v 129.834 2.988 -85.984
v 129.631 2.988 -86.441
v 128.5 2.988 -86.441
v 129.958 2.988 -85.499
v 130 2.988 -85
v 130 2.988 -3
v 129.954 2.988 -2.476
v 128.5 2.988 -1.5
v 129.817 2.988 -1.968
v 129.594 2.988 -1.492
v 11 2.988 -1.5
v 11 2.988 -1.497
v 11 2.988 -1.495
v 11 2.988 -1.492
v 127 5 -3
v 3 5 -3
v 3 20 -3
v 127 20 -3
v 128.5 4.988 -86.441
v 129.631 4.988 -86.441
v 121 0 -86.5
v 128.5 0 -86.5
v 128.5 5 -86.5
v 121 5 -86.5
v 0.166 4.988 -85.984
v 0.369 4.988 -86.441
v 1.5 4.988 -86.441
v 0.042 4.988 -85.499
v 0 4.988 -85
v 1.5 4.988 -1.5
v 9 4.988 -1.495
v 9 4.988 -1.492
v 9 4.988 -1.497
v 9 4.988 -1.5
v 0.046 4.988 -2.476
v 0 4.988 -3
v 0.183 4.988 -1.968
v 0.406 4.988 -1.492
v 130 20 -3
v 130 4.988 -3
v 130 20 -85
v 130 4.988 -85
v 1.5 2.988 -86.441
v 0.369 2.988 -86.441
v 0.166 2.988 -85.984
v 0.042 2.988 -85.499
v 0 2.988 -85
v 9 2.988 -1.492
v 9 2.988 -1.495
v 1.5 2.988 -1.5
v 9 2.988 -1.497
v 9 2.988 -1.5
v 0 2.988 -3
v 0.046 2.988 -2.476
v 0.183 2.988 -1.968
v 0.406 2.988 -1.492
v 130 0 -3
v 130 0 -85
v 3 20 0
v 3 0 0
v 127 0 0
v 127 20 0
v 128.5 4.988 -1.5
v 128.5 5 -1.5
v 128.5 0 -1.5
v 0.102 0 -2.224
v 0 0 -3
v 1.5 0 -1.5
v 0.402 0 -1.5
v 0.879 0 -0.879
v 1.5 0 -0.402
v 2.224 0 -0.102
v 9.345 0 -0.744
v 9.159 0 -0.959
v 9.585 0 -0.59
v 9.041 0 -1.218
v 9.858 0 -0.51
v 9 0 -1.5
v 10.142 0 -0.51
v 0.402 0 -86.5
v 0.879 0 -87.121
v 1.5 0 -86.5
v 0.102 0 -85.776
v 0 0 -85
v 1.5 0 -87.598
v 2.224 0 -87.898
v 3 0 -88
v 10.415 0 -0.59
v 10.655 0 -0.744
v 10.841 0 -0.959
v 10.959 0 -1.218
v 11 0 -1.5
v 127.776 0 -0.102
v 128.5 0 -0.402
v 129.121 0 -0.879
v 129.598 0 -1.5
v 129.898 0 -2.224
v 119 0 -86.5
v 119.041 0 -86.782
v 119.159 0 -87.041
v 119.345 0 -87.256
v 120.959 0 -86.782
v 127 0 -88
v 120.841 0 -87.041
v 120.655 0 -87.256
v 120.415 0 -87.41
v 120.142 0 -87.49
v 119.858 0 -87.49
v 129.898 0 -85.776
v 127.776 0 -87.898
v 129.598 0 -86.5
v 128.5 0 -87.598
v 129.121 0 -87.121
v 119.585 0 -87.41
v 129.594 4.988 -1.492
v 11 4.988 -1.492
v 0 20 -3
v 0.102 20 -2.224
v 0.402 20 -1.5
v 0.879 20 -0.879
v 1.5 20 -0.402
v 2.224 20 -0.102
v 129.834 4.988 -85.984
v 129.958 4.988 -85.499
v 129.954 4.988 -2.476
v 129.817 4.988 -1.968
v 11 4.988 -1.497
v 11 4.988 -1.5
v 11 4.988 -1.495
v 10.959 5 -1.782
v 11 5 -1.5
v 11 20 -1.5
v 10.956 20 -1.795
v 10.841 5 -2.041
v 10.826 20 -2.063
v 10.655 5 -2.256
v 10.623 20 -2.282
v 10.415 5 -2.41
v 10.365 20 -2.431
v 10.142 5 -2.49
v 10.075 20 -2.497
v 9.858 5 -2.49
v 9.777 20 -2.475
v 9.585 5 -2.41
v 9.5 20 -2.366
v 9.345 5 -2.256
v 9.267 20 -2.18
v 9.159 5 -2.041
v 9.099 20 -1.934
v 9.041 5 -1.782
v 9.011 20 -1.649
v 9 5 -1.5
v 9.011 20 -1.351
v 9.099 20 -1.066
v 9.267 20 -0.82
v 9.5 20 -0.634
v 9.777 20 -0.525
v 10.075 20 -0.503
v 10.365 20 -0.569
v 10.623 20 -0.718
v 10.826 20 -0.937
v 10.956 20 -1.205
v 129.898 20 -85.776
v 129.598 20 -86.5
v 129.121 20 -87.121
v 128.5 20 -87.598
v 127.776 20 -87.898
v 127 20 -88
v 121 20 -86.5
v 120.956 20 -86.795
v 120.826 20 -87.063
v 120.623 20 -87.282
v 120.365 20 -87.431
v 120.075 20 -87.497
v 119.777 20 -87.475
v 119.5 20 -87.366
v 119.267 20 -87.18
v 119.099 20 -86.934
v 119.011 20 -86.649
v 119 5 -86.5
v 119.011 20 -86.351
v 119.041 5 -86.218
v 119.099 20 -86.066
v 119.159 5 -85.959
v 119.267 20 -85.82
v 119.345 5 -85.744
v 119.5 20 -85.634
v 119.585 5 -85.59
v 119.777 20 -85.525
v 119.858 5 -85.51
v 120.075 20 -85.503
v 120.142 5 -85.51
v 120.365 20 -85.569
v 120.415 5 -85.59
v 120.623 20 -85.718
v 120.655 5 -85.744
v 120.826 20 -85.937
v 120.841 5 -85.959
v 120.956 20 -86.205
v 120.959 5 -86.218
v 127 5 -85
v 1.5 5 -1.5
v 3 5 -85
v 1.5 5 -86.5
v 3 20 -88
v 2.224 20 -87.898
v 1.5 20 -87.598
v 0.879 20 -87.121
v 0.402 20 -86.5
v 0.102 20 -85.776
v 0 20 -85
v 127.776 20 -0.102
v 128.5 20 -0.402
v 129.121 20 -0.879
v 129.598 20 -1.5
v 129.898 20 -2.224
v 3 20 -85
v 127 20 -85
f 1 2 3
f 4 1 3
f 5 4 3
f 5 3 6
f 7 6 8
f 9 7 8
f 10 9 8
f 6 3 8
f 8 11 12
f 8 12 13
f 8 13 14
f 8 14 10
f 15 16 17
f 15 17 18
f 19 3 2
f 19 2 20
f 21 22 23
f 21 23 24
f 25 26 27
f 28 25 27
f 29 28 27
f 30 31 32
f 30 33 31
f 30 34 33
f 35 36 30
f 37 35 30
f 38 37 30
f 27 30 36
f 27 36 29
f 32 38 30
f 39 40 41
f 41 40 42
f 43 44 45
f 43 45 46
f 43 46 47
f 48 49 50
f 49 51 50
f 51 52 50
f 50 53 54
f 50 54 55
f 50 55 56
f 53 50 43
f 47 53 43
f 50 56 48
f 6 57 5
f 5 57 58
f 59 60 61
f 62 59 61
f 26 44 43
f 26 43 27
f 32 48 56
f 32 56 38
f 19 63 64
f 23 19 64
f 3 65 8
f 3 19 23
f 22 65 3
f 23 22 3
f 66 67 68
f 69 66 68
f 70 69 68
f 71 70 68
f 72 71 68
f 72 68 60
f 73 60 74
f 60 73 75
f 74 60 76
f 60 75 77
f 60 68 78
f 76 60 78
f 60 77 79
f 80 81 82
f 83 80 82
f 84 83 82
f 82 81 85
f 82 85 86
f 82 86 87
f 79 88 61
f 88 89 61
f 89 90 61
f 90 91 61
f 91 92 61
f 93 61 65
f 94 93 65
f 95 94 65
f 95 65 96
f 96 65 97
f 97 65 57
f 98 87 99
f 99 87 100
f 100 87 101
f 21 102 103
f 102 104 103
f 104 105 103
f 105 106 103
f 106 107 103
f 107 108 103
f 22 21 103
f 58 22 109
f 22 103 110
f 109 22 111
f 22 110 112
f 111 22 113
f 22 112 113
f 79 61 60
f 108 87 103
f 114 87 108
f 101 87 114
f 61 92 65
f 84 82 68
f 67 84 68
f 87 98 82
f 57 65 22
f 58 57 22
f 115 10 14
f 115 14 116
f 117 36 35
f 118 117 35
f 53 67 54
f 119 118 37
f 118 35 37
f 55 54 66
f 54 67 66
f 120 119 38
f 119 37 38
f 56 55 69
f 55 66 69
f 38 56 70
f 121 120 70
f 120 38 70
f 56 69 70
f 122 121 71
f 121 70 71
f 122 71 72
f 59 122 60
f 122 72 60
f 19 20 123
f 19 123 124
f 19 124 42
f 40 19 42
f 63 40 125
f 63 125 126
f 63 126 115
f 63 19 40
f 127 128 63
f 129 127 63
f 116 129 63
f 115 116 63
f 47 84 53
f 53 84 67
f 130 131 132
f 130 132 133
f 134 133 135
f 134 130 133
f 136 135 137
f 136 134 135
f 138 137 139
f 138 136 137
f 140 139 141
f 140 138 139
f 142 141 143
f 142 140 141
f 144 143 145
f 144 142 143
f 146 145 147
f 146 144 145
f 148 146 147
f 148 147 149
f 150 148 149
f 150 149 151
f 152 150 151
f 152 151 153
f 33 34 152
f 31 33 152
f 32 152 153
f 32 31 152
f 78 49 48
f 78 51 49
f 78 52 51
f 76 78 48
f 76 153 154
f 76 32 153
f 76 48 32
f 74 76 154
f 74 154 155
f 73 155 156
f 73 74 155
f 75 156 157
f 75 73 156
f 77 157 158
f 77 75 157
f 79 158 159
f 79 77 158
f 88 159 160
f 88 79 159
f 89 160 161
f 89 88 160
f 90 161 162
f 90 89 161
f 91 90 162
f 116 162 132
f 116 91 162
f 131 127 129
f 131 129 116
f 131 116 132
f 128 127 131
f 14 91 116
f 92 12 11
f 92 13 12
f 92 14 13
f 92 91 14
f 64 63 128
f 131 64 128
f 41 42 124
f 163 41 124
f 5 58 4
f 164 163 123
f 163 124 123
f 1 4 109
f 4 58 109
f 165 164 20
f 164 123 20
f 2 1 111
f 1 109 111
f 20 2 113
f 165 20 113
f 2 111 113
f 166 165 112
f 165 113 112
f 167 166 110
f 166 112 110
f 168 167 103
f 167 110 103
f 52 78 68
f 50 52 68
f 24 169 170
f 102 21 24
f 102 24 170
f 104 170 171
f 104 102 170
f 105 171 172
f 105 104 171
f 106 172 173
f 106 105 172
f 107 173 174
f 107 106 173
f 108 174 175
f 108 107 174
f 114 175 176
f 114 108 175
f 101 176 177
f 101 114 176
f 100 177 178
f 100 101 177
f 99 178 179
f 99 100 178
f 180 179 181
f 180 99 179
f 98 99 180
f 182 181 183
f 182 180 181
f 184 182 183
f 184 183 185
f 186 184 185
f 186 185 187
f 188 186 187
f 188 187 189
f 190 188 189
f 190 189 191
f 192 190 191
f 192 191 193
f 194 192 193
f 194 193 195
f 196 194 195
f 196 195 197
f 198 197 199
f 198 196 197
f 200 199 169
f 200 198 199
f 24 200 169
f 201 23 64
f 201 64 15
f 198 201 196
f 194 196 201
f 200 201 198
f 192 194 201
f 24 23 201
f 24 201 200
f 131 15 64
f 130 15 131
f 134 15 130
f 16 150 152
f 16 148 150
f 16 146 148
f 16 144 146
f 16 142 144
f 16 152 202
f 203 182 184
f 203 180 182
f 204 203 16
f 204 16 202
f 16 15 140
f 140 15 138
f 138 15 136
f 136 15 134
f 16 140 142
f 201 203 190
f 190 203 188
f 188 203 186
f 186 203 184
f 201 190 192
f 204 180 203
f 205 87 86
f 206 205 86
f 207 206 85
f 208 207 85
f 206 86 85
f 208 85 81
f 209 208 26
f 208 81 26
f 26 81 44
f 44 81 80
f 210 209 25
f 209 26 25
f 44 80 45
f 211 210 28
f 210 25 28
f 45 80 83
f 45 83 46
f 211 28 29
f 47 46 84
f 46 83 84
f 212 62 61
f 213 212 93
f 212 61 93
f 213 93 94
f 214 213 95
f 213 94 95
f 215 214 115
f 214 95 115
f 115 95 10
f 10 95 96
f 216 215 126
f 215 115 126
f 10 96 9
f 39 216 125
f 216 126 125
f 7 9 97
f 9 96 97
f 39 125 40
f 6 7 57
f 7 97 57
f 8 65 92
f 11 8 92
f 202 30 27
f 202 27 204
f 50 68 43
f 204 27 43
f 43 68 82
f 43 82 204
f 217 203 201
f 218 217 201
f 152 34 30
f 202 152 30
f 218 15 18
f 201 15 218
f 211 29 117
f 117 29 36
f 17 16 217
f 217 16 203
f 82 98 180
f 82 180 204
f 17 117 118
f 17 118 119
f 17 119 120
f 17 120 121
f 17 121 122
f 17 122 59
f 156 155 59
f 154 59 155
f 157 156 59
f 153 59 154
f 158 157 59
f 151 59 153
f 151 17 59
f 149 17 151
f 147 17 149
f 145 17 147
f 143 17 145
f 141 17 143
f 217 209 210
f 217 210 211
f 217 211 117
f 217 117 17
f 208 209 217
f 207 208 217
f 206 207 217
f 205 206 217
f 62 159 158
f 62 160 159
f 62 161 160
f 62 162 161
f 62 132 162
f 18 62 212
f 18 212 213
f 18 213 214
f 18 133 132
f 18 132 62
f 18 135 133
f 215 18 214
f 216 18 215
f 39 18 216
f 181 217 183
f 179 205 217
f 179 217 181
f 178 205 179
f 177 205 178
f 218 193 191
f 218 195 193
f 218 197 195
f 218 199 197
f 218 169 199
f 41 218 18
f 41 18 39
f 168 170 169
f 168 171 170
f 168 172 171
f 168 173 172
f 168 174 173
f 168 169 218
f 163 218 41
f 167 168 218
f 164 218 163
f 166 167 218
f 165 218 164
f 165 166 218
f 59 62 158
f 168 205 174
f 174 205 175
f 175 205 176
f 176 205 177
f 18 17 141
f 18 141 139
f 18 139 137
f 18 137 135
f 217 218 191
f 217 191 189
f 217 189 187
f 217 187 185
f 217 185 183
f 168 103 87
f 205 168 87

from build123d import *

# Parameters (mm, degrees)
SKETCH_1_R          = 1
SKETCH_1_W          = 124
SKETCH_1_H          = 82
EXTRUDE_2_DEPTH     = 20
SKETCH_2_W          = 127
SKETCH_2_H          = 85
CUT_EXTRUDE_1_DEPTH = 5
SKETCH_3_W          = 84.949028024
SKETCH_3_H          = 2
CUT_EXTRUDE_3_DEPTH = 164


with BuildPart() as part:
    # Эскиз1 → Бобышка-Вытянуть2 (new body)
    with BuildSketch(Plane(origin=(0, 0, 0), x_dir=(1, 0, 0), z_dir=(0, 1, 0))):
        with BuildLine():
            Line((3, 0), (127, 0))
            ThreePointArc((127, 0), (129.121320344, 0.878679656), (130, 3))
            Line((130, 3), (130, 85))
            ThreePointArc((130, 85), (129.121320344, 87.121320344), (127, 88))
            Line((127, 88), (3, 88))
            ThreePointArc((3, 88), (0.878679656, 87.121320344), (0, 85))
            Line((0, 85), (0, 3))
            ThreePointArc((0, 3), (0.878679656, 0.878679656), (3, 0))
        make_face()
        with Locations((120, 86.5)):
            Circle(SKETCH_1_R, mode=Mode.SUBTRACT)
        with Locations((10, 1.5)):
            Circle(SKETCH_1_R, mode=Mode.SUBTRACT)
        with Locations((65, 44)):
            Rectangle(SKETCH_1_W, SKETCH_1_H, mode=Mode.SUBTRACT)
    extrude(amount=EXTRUDE_2_DEPTH)

    # Эскиз2 → Вырез-Вытянуть1 (cut)
    with BuildSketch(Plane(origin=(0, 0, 0), x_dir=(-1, 0, 0), z_dir=(0, -1, 0))):
        with Locations((-65, 44)):
            Rectangle(SKETCH_2_W, SKETCH_2_H)
    extrude(amount=-CUT_EXTRUDE_1_DEPTH, mode=Mode.SUBTRACT)

    # Эскиз3 → Вырез-Вытянуть3 (cut)
    with BuildSketch(Plane.ZY):
        with Locations((-43.966717109, 3.987675958)):
            Rectangle(SKETCH_3_W, SKETCH_3_H)
    extrude(amount=-CUT_EXTRUDE_3_DEPTH, mode=Mode.SUBTRACT)


solid = part.part
